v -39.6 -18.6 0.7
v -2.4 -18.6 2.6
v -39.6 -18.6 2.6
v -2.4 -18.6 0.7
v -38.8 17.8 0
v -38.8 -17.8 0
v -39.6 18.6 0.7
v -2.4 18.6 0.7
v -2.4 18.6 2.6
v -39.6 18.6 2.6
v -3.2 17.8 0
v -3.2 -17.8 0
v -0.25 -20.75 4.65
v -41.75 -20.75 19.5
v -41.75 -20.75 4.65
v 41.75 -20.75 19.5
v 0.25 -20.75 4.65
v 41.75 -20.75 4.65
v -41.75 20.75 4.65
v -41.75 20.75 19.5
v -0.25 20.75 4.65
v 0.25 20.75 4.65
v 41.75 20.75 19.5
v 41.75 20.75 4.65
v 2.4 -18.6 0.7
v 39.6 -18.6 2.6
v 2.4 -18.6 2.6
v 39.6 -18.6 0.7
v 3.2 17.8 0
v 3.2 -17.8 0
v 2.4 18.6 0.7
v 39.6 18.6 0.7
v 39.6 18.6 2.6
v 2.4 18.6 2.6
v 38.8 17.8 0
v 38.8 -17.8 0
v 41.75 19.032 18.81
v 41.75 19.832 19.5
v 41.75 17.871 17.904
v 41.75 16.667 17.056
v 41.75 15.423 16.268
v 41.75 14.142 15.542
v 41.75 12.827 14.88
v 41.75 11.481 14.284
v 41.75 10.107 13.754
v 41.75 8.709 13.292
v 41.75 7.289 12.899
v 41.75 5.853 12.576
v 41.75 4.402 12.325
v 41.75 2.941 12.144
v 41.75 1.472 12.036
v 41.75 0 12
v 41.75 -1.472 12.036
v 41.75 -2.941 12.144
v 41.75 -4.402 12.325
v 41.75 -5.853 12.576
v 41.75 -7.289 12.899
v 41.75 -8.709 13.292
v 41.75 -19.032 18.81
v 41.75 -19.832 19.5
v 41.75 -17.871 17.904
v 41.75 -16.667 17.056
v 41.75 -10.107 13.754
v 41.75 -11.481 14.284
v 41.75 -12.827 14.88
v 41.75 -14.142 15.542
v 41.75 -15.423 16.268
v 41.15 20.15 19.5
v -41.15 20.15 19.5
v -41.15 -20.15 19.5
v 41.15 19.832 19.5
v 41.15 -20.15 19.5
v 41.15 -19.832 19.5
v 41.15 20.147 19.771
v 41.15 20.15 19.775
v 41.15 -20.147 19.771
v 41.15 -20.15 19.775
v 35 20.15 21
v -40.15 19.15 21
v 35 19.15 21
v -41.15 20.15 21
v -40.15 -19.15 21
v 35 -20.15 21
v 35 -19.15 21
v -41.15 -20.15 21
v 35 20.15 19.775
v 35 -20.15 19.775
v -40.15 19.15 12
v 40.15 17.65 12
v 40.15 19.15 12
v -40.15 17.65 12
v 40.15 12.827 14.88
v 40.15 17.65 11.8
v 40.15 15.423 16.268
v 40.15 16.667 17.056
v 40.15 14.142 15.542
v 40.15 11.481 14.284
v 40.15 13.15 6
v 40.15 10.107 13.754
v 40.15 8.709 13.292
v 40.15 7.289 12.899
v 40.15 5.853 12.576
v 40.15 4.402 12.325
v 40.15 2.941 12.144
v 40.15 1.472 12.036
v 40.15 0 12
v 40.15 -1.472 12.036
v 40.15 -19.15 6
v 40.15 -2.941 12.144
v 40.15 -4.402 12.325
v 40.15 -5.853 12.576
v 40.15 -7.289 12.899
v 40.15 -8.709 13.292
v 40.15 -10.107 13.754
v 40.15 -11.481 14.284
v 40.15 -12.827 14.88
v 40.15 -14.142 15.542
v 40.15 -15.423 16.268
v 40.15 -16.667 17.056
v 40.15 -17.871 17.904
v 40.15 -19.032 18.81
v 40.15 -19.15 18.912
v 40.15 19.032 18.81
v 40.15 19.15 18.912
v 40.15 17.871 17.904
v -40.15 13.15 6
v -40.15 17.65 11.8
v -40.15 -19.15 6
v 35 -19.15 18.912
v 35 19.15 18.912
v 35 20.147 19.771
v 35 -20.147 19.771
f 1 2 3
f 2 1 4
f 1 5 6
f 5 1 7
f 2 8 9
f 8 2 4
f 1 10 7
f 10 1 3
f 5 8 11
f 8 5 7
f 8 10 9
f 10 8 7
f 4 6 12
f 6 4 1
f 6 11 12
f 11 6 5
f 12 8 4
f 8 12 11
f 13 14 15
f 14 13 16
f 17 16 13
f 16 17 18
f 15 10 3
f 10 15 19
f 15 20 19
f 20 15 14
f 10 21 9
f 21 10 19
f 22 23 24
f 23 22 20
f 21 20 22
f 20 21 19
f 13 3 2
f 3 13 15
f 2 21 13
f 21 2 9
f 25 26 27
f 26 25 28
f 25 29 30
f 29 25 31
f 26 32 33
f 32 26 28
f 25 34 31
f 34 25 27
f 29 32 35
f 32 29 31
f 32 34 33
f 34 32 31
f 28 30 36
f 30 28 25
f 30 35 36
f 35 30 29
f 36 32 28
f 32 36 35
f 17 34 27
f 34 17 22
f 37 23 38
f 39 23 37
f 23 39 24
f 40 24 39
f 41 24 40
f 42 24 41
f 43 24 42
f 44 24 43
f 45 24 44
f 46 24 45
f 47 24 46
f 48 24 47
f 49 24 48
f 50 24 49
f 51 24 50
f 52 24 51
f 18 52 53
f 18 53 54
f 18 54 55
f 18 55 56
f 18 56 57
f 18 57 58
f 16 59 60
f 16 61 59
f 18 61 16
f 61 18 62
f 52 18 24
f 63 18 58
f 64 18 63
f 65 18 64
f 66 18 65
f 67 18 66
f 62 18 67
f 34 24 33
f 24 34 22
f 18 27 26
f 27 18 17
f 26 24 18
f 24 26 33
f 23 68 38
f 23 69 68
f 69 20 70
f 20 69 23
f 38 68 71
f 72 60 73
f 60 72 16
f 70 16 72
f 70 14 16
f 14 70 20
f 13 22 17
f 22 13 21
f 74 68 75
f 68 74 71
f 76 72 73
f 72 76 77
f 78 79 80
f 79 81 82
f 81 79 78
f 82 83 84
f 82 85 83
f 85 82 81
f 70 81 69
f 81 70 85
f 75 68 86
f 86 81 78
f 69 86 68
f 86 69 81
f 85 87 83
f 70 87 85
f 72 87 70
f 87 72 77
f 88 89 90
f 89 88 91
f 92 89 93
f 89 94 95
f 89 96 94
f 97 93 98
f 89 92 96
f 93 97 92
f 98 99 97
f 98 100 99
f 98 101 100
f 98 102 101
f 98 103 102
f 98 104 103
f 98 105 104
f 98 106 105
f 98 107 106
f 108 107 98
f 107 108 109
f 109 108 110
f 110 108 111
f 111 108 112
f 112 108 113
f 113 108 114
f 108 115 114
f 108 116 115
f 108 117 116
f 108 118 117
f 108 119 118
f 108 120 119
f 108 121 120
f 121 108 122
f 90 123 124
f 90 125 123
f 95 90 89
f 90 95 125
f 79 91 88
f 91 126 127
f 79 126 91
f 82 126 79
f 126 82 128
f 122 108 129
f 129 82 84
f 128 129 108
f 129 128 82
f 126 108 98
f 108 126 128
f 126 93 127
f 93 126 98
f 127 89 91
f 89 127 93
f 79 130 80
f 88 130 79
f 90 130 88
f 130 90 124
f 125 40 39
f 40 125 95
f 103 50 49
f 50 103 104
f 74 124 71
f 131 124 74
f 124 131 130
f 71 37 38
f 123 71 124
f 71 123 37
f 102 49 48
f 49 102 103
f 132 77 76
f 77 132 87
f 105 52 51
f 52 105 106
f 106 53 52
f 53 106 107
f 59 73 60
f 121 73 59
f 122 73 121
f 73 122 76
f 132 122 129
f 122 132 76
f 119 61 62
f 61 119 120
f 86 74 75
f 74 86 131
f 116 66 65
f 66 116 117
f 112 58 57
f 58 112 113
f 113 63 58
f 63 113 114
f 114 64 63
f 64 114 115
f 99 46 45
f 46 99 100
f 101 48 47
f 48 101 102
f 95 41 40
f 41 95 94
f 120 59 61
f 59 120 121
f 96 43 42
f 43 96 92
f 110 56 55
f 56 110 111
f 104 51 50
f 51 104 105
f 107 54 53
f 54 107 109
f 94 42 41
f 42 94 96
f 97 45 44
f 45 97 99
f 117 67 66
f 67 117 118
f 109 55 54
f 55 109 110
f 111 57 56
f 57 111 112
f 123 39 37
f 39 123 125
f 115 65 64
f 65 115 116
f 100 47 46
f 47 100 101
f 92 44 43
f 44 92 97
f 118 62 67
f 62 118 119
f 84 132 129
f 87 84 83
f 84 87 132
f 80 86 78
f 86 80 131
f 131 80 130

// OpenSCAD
// Gridfinity bin, 2x1 x 3U tall
// Outside 83.5 x 41.5 mm, height 21 mm (3x7mm), PLA, 0.4mm nozzle, no supports
// Print orientation: +Z up, bottom (foot bottoms) on bed at z=0

Lx = 83.5;
Ly = 41.5;
H = 21;
foot_z0 = 0;
foot_z1 = 0.8;
foot_z2 = 2.6;   // 0.8+1.8
foot_z3 = 4.75;  // 0.8+1.8+2.15
foot_btm = 35.6; // 41.5-5.9
foot_mid = 37.2; // 35.6+1.6
foot_top = 41.5;
wall_t = 1.6;
floor_z = 6.0;
lip_z = 19.5;
lip_inset = 0.6;

echo(cadverify_spec = [
    ["bounds", [[-41.75, -20.75, 0], [41.75, 20.75, 21]]],
    ["bodies", 1],
    ["through_holes", 0],
    ["support_faces", [["bed", "-z", 2000]]],
    ["overhangs_allowed", []],
    ["copies", 1],
    ["details", [
        ["foot_left", "material", [[-30, -10, 0.1], [-12, 10, 0.7]], 0.9],
        ["foot_right", "material", [[12, -10, 0.1], [30, 10, 0.7]], 0.9],
        ["stack_lip", "material", [[-20, 19.3, 19.6], [20, 20.0, 20.9]], 0.9],
        ["label_shelf", "material", [[-30, 16, 6.5], [30, 18.5, 8]], 0.9],
        ["scoop_void", "void", [[40.5, -10, 14], [42.5, 10, 20]], 0.9],
        ["wall_side", "thickness", [38, 22, 16], [0, -1, 0], 1.6],
        ["floor", "thickness", [-21, 0, -5], [0, 0, 1], 6.0],
        ["foot_profile", "view", [[-39, -18, 0], [-3, 18, 5]]],
        ["scoop_view", "view", [[35, -15, 10], [43, 15, 22]]],
        ["label_view", "view", [[-10, 12, 6], [10, 20, 13]]],
        ["lip_view", "view", [[-15, 18.5, 18.5], [15, 21, 21.5]]]
    ]]
]);

module foot(cx) {
    translate([cx, 0, 0]) {
        // bottom 45deg frustum: 35.6 -> 37.2 over 0.8
        hull() {
            translate([-foot_btm/2, -foot_btm/2, 0]) cube([foot_btm, foot_btm, 0.1]);
            translate([-foot_mid/2, -foot_mid/2, foot_z1-0.1]) cube([foot_mid, foot_mid, 0.1]);
        }
        // vertical 1.8
        translate([-foot_mid/2, -foot_mid/2, foot_z1]) cube([foot_mid, foot_mid, foot_z2-foot_z1]);
        // top 45deg frustum: 37.2 -> 41.5 over 2.15
        hull() {
            translate([-foot_mid/2, -foot_mid/2, foot_z2]) cube([foot_mid, foot_mid, 0.1]);
            translate([-foot_top/2, -foot_top/2, foot_z3-0.1]) cube([foot_top, foot_top, 0.1]);
        }
    }
}

module bin_solid() {
    foot(-21);
    foot(21);
    // main outer body, overlap feet top by 0.1
    translate([-Lx/2, -Ly/2, foot_z3-0.1]) cube([Lx, Ly, lip_z-(foot_z3-0.1)]);
    // stacking lip: stepped inward 0.6 per side, no overhang
    translate([-(Lx-2*lip_inset)/2, -(Ly-2*lip_inset)/2, lip_z]) cube([Lx-2*lip_inset, Ly-2*lip_inset, H-lip_z]);
    // label shelf wedge along +Y inside, sits on floor against wall
    // y_in=19.15, bottom from 13.15 to 19.35, top from 17.65 to 19.35
    hull() {
        translate([-35, 13.15, 5.9]) cube([70, 19.35-13.15, 0.2]);
        translate([-35, 17.65, 11.9]) cube([70, 19.35-17.65, 0.2]);
    }
}

module bin() {
    x_in = (Lx-2*wall_t)/2;
    y_in0 = -(Ly-2*wall_t)/2;
    y_in1 = (Ly-2*wall_t)/2;
    shelf_y0 = 13.15;
    shelf_y1 = 17.65;
    shelf_z0 = 6.0;
    shelf_z1 = 12.0;
    difference() {
        bin_solid();
        // lower cavity, fronted by label shelf slope on +Y
        hull() {
            translate([-x_in, y_in0, shelf_z0]) cube([2*x_in, shelf_y0-y_in0, 0.2]);
            translate([-x_in, y_in0, shelf_z1-0.2]) cube([2*x_in, shelf_y1-y_in0, 0.2]);
        }
        // upper cavity full width
        translate([-x_in, y_in0, shelf_z1]) cube([2*x_in, y_in1-y_in0, H-shelf_z1+1]);
        // scoop at +X front: cylinder axis X, R30 center z42 -> bottom 12 at center
        translate([41.0, 0, 42]) rotate([0, 90, 0]) cylinder(r=30, h=12, center=true, $fn=128);
    }
}

bin();
